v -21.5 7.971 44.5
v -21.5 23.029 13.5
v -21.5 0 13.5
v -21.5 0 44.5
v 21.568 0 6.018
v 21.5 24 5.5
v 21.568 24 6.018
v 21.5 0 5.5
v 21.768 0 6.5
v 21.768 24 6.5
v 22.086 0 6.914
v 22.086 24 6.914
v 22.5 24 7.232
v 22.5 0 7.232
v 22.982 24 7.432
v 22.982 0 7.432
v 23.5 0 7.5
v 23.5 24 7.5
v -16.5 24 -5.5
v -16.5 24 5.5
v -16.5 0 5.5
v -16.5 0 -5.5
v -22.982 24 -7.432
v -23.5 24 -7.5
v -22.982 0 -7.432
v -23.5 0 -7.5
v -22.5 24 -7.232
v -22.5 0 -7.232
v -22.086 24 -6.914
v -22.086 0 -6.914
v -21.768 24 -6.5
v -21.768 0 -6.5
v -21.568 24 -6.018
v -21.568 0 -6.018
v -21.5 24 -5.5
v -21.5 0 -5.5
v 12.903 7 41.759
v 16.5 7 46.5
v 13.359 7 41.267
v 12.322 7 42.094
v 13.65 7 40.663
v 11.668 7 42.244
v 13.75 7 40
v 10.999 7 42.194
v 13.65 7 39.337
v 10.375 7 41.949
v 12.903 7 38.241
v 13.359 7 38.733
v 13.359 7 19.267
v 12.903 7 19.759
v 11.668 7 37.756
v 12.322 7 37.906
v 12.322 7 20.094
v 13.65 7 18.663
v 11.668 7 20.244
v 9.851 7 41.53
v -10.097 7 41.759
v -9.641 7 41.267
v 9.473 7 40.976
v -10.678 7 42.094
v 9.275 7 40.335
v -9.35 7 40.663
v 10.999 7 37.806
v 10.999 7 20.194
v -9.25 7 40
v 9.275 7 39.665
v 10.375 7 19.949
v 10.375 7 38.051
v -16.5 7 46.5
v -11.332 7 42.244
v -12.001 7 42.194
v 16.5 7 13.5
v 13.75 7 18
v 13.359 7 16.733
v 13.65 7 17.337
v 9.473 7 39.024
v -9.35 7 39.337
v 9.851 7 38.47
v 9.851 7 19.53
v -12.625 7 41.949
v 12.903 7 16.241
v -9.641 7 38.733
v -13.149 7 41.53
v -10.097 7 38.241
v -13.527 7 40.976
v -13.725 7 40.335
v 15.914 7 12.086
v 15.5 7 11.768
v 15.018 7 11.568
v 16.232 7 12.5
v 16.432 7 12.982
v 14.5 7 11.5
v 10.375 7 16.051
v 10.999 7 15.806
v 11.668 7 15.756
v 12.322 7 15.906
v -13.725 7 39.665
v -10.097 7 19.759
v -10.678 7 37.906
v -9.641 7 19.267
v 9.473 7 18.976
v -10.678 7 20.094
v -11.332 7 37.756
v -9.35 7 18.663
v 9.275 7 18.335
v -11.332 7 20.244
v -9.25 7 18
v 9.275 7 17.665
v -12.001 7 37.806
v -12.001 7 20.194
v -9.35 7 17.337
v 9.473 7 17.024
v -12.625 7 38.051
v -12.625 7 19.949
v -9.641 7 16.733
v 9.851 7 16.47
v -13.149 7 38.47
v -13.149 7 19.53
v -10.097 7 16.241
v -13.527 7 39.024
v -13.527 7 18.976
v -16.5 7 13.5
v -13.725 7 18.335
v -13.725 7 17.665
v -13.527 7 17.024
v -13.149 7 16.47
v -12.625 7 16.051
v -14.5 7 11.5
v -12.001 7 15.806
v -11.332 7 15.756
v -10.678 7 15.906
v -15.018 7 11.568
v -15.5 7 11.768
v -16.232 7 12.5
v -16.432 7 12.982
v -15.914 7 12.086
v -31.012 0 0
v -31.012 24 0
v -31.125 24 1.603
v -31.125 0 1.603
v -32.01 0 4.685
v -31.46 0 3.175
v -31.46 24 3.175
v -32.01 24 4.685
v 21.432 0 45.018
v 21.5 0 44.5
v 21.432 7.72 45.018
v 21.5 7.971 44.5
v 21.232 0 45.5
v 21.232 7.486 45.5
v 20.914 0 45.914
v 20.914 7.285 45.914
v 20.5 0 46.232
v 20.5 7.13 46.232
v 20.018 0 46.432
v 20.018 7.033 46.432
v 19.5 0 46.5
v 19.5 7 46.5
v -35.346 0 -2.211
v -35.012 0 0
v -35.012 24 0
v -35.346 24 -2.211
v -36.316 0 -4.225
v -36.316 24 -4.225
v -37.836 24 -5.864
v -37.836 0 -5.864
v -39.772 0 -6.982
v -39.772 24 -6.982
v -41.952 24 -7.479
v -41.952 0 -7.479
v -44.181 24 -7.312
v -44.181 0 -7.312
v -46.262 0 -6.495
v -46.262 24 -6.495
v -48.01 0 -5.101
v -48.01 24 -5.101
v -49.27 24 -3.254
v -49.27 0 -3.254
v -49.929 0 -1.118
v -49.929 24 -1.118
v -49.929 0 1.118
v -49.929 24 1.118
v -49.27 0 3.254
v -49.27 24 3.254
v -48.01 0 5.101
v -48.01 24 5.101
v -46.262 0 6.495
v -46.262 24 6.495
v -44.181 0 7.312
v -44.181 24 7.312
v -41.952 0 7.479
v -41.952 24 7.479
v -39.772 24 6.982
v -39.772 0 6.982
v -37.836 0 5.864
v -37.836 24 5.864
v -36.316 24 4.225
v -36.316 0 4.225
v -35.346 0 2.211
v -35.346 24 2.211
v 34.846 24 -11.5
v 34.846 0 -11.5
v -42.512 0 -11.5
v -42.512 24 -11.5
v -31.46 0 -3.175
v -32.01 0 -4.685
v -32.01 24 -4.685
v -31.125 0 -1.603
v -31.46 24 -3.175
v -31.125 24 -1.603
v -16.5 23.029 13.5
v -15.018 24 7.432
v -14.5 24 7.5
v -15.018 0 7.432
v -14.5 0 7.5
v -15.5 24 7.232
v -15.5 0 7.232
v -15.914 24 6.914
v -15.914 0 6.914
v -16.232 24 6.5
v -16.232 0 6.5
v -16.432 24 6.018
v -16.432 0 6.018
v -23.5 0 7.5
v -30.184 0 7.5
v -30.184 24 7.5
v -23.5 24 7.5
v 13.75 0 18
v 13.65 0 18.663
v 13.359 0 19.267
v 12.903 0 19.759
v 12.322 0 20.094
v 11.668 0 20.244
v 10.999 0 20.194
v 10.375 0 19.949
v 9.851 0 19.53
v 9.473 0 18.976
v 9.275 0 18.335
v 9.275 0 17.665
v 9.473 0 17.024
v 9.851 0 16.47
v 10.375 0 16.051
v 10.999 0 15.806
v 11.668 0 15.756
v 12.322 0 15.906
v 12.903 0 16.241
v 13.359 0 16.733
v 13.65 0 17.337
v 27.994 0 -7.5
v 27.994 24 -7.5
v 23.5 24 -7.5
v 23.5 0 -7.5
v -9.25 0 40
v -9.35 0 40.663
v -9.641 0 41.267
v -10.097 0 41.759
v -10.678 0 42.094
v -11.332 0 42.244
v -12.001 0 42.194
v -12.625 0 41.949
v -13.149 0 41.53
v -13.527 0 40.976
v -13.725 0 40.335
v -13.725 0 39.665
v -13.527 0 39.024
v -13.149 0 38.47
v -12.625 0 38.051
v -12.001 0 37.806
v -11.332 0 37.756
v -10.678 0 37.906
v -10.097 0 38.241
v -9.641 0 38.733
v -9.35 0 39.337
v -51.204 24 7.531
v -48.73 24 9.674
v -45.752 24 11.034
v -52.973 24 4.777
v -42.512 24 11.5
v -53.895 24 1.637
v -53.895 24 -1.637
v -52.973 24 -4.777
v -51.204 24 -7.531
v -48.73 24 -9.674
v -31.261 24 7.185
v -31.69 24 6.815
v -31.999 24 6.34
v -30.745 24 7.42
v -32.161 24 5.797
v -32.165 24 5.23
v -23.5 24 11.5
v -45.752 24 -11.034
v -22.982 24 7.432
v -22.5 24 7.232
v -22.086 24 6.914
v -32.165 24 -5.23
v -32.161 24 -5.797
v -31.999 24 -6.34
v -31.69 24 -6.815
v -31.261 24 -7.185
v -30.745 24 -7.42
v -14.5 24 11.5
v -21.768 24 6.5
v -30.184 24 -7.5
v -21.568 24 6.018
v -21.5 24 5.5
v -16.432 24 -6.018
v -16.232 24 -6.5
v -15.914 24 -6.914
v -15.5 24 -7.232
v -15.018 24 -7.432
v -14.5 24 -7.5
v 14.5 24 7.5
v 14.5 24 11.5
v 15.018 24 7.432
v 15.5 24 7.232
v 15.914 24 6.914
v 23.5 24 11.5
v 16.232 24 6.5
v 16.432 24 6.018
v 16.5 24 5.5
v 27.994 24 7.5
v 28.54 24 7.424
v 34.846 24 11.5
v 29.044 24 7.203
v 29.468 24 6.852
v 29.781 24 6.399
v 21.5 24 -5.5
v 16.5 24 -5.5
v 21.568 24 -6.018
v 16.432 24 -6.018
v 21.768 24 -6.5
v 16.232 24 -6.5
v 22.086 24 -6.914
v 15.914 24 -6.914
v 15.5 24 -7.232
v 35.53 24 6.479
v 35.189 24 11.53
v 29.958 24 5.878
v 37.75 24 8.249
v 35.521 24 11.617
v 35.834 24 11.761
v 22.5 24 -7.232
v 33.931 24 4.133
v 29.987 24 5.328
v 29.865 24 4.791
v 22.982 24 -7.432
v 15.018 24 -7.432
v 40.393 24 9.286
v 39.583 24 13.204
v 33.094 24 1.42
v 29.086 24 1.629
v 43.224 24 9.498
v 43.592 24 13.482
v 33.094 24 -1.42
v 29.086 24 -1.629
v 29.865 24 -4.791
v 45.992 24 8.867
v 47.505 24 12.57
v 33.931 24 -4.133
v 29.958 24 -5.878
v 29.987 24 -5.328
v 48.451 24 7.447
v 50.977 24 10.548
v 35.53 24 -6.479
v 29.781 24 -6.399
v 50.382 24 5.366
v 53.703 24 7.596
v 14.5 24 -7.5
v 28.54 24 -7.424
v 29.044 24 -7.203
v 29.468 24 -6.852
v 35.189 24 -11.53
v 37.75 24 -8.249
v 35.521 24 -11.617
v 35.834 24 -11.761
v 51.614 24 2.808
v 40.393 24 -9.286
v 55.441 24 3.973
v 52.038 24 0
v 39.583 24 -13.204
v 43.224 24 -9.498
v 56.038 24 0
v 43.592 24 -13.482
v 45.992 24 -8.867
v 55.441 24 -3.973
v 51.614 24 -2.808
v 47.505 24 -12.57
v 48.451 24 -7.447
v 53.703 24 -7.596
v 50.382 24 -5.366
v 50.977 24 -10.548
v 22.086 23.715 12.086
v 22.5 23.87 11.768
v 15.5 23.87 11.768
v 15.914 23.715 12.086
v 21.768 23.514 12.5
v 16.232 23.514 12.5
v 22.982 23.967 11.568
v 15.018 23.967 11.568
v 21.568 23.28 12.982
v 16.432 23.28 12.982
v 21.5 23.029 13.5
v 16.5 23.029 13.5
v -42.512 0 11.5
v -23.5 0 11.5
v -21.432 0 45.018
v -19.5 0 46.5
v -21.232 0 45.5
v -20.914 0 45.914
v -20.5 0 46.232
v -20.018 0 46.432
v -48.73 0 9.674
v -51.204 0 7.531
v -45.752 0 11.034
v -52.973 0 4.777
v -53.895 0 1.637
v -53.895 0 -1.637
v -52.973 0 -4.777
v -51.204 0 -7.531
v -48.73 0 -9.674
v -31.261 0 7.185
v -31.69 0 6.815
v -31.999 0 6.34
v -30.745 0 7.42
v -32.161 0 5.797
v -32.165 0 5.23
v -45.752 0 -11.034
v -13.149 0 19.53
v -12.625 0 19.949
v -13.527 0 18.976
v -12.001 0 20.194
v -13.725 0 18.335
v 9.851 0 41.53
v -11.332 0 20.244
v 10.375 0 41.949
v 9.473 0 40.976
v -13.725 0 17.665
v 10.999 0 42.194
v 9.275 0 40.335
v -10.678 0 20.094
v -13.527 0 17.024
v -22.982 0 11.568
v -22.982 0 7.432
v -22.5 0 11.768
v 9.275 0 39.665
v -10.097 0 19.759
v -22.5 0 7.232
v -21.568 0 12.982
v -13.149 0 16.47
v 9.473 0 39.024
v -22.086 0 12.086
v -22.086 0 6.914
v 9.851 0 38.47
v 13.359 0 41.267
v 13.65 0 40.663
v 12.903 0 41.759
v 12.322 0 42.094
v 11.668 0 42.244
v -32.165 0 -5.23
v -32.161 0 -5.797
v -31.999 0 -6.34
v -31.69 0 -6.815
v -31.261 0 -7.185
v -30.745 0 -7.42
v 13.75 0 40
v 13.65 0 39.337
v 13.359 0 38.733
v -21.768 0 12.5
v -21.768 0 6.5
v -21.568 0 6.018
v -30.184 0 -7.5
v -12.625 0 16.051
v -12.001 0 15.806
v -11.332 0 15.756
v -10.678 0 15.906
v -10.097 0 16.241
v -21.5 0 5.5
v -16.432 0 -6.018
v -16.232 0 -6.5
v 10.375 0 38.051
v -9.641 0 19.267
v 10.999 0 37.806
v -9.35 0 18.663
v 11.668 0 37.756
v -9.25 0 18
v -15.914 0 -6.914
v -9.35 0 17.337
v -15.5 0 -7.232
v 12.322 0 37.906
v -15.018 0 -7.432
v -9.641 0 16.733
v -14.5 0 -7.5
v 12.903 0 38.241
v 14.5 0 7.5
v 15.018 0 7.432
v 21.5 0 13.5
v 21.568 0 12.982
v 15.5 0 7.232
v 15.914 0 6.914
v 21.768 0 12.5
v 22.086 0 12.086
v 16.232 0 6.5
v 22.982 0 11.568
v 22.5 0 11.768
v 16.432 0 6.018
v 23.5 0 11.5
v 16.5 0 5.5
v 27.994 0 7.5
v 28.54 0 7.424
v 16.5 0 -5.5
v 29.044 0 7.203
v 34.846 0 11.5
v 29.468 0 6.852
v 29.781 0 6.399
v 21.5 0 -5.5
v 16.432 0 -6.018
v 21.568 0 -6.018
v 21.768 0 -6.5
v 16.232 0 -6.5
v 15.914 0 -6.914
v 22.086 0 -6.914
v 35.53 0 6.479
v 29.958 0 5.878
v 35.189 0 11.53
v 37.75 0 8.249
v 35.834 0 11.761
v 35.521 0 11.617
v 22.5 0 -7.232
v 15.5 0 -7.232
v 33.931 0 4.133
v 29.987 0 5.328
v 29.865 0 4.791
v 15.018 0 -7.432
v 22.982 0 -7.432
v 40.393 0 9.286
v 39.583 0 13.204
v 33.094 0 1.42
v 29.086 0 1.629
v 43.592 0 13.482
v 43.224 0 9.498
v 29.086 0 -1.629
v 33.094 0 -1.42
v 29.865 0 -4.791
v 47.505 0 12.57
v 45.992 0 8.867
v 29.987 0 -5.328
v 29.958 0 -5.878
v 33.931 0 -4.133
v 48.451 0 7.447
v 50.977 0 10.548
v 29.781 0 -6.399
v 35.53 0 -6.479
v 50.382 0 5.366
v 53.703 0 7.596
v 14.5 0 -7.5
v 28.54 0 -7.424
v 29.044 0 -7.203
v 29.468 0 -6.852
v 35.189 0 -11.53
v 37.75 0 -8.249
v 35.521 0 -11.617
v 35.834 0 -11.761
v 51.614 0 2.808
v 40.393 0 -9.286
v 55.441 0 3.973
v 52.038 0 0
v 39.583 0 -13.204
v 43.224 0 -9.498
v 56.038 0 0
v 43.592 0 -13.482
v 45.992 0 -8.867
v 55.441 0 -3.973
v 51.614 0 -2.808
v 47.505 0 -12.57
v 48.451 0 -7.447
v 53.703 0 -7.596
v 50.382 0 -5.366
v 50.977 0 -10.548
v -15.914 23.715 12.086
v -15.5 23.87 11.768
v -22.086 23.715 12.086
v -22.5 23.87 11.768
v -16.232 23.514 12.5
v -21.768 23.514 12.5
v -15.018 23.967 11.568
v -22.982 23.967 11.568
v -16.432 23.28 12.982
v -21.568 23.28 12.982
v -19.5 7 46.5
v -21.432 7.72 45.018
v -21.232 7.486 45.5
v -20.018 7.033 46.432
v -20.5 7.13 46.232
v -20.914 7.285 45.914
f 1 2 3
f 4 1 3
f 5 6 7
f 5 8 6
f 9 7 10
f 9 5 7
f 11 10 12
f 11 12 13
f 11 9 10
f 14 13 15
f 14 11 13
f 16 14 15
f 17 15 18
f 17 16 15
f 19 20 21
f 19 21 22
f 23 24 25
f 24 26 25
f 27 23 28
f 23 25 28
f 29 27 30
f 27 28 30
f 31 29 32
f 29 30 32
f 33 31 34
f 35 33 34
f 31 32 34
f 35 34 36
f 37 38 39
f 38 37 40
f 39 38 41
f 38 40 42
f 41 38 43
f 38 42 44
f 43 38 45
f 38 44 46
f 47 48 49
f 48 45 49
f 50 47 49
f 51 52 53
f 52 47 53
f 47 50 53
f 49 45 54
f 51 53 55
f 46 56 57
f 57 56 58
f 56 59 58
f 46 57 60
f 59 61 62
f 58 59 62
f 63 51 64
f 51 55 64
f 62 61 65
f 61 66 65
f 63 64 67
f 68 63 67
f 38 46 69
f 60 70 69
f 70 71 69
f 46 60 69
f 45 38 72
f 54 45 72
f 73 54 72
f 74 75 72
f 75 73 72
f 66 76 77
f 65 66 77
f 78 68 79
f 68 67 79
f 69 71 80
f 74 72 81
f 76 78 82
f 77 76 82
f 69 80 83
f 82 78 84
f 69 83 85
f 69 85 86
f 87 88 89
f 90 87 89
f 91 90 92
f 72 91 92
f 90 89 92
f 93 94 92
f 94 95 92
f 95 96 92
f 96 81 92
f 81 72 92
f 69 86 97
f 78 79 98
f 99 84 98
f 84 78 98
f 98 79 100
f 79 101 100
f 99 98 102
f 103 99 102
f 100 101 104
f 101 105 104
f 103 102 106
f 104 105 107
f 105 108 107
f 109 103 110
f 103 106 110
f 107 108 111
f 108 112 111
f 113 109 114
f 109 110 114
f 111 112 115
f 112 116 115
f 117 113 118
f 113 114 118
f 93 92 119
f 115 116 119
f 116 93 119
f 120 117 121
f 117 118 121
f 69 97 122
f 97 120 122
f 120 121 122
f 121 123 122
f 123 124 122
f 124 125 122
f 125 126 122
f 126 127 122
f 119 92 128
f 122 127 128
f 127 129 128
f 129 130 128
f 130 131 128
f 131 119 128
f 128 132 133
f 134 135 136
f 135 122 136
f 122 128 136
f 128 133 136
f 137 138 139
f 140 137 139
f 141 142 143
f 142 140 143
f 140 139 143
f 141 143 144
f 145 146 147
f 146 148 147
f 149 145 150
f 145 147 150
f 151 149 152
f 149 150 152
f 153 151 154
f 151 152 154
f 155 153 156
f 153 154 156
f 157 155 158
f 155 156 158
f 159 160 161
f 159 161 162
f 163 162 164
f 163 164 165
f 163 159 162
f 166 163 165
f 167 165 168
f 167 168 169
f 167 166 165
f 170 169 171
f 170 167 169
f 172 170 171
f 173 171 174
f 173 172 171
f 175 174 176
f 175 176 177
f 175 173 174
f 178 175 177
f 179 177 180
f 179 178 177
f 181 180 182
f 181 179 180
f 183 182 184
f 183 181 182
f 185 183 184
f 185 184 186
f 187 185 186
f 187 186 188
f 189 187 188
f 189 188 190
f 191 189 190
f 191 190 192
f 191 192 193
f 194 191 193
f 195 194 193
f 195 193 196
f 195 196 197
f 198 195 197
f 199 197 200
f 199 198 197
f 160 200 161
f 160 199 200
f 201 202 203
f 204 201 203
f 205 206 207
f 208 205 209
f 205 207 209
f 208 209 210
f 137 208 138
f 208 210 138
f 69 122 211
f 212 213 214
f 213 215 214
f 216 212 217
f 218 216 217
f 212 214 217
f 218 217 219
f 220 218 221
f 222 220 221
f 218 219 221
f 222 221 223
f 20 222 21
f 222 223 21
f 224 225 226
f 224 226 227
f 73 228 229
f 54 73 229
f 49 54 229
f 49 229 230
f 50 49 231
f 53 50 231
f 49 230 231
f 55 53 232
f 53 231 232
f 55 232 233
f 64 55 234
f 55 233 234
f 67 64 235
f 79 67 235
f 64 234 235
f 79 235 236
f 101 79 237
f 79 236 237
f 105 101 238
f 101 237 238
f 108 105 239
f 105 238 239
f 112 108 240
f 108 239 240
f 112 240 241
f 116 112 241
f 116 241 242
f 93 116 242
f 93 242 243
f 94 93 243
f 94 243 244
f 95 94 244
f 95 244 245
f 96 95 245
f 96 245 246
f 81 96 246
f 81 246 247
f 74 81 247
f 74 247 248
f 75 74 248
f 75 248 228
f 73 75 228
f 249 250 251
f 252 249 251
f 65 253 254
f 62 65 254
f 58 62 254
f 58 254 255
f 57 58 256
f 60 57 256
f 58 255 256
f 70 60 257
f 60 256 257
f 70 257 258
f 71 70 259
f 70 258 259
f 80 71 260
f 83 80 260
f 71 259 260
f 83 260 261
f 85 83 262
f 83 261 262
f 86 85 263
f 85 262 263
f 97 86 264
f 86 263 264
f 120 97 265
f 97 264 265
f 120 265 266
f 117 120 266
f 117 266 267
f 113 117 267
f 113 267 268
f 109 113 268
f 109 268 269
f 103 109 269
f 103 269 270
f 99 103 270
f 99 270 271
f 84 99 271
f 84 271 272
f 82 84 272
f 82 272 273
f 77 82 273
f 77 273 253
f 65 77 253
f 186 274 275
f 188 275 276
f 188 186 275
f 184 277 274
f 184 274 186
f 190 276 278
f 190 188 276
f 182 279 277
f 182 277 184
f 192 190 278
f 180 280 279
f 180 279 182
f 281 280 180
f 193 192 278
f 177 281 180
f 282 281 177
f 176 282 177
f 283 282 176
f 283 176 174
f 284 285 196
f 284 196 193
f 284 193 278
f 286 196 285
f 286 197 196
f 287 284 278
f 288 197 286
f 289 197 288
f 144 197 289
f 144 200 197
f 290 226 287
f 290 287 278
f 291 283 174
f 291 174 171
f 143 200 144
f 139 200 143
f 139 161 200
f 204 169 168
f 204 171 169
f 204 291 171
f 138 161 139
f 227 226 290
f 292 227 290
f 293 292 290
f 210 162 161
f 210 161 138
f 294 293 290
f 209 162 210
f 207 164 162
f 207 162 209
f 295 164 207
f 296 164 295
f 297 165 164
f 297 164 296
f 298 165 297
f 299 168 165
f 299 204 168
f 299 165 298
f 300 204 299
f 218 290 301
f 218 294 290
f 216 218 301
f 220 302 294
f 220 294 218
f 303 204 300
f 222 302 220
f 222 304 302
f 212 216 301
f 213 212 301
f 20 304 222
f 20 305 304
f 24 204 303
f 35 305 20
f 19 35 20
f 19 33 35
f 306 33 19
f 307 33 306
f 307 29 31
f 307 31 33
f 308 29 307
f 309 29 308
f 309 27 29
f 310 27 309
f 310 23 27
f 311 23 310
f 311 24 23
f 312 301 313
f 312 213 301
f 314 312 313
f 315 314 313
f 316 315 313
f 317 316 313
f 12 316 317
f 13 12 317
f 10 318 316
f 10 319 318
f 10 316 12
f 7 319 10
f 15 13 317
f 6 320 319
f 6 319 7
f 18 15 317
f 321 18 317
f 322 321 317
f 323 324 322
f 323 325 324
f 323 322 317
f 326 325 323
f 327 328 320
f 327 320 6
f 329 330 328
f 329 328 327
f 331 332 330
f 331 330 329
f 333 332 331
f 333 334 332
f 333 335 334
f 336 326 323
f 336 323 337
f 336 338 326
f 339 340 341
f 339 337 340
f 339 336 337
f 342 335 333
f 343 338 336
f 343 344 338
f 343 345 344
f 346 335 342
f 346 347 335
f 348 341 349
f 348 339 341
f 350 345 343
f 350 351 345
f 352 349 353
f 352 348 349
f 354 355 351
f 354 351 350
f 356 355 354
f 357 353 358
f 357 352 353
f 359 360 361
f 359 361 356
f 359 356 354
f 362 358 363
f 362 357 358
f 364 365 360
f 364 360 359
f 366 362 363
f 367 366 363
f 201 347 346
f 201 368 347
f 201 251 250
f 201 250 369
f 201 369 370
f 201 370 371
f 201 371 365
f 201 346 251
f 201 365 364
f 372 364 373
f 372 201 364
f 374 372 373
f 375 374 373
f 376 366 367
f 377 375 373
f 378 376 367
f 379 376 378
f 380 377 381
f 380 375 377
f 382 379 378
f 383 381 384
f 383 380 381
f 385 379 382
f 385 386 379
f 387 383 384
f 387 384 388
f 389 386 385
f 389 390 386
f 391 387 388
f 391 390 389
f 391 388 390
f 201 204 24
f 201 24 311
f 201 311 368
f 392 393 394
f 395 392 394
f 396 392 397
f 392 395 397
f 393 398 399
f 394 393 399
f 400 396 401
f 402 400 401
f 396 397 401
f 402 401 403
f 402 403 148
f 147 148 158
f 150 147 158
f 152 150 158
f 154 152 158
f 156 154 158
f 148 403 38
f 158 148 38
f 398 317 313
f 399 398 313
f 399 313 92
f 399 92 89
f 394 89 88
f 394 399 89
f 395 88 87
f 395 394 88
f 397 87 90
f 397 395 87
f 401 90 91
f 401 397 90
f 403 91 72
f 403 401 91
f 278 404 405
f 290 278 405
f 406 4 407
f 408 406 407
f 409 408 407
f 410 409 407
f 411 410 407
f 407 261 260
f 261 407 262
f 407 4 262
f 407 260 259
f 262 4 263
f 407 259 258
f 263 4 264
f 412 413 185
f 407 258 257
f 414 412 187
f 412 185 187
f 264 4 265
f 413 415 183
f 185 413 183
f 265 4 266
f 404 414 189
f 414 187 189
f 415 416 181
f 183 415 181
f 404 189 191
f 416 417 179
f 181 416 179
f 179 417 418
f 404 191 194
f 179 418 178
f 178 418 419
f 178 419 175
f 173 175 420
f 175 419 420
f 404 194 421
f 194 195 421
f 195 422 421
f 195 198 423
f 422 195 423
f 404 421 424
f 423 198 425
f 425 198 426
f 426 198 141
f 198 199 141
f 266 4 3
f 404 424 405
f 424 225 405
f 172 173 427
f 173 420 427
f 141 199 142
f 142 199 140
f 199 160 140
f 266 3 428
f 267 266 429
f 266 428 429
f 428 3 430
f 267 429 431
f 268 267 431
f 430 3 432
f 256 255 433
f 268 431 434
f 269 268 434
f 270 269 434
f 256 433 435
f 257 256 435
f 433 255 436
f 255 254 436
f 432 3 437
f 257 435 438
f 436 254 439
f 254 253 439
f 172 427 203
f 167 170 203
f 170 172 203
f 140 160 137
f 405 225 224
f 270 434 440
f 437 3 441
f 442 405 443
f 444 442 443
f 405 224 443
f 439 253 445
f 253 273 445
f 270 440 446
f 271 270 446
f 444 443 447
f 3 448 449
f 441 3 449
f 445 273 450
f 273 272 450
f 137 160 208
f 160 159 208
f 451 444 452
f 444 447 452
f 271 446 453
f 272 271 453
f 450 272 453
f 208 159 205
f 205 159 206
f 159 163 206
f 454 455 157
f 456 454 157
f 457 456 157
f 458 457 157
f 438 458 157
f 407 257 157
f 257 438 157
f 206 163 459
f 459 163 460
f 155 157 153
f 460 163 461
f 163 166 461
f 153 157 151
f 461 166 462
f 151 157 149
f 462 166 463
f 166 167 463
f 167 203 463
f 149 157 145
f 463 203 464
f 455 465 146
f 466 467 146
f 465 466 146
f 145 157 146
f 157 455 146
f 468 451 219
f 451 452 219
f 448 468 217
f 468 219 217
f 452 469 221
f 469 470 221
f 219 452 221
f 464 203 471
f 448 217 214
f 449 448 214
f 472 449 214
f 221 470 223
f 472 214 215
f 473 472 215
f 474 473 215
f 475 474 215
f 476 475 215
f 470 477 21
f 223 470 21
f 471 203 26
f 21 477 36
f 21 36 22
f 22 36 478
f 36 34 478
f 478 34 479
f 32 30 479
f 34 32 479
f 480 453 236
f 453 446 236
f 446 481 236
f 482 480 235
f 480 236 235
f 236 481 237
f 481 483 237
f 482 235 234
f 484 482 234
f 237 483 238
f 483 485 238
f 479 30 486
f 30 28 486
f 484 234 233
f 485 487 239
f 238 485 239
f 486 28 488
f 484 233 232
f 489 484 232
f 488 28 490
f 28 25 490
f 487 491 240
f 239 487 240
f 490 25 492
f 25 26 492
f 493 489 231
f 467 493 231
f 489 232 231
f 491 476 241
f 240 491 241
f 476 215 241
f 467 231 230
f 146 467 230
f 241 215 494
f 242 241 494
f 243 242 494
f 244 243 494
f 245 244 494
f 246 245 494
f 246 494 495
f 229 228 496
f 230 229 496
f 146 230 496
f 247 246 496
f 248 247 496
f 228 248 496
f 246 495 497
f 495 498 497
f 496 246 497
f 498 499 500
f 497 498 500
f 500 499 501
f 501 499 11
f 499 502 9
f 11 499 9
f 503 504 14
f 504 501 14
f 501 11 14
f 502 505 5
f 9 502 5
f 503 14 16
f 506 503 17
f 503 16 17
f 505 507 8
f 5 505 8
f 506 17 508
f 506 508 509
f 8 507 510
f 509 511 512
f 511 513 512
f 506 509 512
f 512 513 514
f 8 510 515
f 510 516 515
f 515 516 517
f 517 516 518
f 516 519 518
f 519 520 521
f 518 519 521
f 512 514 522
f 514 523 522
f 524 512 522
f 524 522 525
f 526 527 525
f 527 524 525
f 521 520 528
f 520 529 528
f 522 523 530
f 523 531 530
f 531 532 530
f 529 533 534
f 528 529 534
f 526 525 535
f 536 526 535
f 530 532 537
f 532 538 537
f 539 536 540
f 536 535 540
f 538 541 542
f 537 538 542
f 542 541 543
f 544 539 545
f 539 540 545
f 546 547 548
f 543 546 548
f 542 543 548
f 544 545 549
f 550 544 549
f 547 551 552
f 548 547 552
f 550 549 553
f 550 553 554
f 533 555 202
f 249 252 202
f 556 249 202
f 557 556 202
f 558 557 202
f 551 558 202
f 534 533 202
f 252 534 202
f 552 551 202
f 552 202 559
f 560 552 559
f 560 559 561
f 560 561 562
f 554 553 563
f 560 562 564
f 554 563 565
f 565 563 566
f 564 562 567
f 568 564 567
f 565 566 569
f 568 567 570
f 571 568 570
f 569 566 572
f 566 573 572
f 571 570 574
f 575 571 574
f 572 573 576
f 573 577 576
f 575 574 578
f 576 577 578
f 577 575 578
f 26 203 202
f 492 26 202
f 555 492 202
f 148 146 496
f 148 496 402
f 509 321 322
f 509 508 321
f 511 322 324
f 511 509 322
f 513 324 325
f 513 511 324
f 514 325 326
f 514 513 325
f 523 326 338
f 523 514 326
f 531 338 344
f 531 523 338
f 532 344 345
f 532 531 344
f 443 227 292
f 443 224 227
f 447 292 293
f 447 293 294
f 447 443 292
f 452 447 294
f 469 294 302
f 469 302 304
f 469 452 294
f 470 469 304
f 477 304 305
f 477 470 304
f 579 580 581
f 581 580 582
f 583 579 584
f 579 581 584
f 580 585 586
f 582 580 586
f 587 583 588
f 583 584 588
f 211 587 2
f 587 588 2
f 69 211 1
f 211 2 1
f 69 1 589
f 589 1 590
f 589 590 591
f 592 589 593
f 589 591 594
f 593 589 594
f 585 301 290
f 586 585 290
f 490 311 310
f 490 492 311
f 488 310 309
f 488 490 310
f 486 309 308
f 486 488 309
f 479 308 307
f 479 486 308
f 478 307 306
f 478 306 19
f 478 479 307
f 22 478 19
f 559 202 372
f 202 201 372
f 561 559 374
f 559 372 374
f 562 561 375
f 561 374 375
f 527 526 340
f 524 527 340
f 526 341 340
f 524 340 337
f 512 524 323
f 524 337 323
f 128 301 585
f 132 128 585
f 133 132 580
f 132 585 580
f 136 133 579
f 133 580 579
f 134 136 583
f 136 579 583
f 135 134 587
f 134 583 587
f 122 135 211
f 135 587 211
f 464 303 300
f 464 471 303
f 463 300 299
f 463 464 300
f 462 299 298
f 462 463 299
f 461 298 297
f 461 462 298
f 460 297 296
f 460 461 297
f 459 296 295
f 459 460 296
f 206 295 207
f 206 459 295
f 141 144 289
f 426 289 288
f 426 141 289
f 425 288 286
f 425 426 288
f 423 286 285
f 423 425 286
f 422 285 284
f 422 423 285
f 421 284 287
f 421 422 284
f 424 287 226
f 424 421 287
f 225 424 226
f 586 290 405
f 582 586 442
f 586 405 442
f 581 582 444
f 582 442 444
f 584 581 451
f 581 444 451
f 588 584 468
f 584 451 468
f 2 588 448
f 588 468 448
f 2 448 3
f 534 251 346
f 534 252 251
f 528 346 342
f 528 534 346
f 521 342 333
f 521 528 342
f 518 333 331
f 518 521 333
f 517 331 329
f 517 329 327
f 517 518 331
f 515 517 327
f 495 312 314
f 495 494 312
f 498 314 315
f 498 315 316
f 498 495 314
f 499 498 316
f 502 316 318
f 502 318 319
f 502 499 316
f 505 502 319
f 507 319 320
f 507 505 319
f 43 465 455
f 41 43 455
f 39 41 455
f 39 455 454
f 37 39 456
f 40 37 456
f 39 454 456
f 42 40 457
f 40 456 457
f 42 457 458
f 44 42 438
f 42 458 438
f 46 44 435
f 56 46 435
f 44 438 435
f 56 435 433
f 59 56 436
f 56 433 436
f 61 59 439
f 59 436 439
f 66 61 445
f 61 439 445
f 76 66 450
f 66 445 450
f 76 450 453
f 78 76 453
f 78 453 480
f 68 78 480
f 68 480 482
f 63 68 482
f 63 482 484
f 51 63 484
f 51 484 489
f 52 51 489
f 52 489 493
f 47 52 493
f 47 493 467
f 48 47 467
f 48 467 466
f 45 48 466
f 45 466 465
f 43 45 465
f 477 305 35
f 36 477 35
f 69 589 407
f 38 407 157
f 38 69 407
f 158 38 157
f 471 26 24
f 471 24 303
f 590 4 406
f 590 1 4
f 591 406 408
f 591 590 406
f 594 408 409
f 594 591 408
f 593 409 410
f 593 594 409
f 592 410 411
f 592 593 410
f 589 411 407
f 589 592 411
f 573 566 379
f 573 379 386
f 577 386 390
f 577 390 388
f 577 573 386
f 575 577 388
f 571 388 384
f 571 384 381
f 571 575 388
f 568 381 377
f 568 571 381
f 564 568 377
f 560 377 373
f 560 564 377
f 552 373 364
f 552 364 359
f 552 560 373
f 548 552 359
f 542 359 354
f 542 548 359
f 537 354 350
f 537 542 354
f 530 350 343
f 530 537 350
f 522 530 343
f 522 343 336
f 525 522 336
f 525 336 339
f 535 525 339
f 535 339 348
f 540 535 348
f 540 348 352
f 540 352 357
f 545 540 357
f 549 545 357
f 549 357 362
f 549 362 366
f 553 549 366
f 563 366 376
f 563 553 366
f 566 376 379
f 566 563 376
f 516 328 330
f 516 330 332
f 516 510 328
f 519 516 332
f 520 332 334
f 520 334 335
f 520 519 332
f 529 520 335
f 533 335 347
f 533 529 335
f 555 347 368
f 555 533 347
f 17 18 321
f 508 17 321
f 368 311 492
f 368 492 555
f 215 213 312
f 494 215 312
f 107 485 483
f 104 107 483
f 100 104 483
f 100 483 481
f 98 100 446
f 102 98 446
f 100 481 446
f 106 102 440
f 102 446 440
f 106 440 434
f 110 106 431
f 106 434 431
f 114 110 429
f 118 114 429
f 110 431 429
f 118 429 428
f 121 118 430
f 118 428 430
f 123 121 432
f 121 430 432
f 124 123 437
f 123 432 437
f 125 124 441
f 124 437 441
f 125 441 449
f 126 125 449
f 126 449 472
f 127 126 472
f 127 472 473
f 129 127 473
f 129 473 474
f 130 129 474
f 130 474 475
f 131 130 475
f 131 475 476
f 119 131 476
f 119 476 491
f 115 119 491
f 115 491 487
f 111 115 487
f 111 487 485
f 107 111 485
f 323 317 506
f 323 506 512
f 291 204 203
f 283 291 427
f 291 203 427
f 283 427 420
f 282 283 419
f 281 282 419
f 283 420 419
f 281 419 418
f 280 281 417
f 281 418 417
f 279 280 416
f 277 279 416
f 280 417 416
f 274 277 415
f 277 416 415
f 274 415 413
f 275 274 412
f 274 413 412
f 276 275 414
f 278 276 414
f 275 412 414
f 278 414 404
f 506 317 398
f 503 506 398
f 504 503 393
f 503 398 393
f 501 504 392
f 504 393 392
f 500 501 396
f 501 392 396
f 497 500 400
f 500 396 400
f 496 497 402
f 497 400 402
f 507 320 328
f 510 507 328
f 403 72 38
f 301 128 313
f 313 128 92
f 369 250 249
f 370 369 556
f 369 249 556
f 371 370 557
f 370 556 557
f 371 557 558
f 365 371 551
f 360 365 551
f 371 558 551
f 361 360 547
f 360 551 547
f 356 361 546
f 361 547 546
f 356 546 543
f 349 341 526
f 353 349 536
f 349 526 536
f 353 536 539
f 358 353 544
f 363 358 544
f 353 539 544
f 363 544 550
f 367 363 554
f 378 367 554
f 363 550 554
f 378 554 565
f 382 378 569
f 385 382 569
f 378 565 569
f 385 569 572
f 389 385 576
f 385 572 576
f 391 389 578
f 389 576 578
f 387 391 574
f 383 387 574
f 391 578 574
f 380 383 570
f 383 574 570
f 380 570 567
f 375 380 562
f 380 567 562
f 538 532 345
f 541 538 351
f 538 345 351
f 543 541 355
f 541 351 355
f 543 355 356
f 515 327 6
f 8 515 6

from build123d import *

# Parameters (mm, degrees)
SKETCH1_R               = 7.5
SKETCH1_R_2             = 9.525
BOSS_EXTRUDE1_DEPTH     = 24
SKETCH8_W               = 5
SKETCH8_H               = 17
BOSS_EXTRUDE4_DEPTH     = 35
CUT_EXTRUDE4_DEPTH      = 33.5125
CUT_EXTRUDE4_DEPTH_BACK = 52
SKETCH10_W              = 33
SKETCH10_H              = 15
CUT_EXTRUDE5_DEPTH      = 35
FILLET1_R               = 2
SKETCH12_R              = 2.25
CUT_EXTRUDE6_DEPTH      = 35


with BuildPart() as part:
    # Sketch1 → Boss-Extrude1 (new body)
    with BuildSketch(Plane(origin=(0, 0, 0), x_dir=(1, 0, 0), z_dir=(0, 1, 0))):
        with BuildLine():
            Line((35.393818591, 11.5), (-42.5125, 11.5))
            ThreePointArc((-42.5125, 11.5), (-54.0125, 0), (-42.5125, -11.5))
            Line((-42.5125, -11.5), (35.393818591, -11.5))
            ThreePointArc((35.393818591, -11.5), (56.0375, 0), (35.393818591, 11.5))
        make_face()
        with Locations((-42.5125, 0)):
            Circle(SKETCH1_R, mode=Mode.SUBTRACT)
        with Locations((42.5125, 0)):
            Circle(SKETCH1_R_2, mode=Mode.SUBTRACT)
    extrude(amount=BOSS_EXTRUDE1_DEPTH)

    # Sketch8 → Boss-Extrude4 (add)
    with BuildSketch(Plane.XY.offset(11.5)):
        with Locations((-19, 15.5)):
            Rectangle(SKETCH8_W, SKETCH8_H)
        Polygon((-16.5, 7), (-21.5, 7), (-21.5, 0), (21.5, 0), (21.5, 7), (16.5, 7), align=None)
        with Locations((19, 15.5)):
            Rectangle(SKETCH8_W, SKETCH8_H)
    extrude(amount=BOSS_EXTRUDE4_DEPTH)

    # Sketch9 → Cut-Extrude4 (cut, two sides)
    with BuildSketch(Plane.ZY.offset(21.5)) as cut_extrude4_sk:
        Polygon((11.5, 24), (46.5, 7), (46.5, 24), align=None)
    extrude(amount=CUT_EXTRUDE4_DEPTH, mode=Mode.SUBTRACT)
    extrude(cut_extrude4_sk.sketch, amount=-CUT_EXTRUDE4_DEPTH_BACK, mode=Mode.SUBTRACT)

    # Sketch10 → Cut-Extrude5 (cut)
    with BuildSketch(Plane(origin=(0, 24, 0), x_dir=(1, 0, 0), z_dir=(0, 1, 0))):
        with BuildLine():
            Line((-21.5, 7.5), (-33.794702113, 7.5))
            ThreePointArc((-33.794702113, 7.5), (-31.730462259, 3.999707758), (-31.0125, 0))
            ThreePointArc((-31.0125, 0), (-31.730462259, -3.999707758), (-33.794702113, -7.5))
            Line((-33.794702113, -7.5), (-21.5, -7.5))
            Line((-21.5, -7.5), (-21.5, 7.5))
        make_face()
        Rectangle(SKETCH10_W, SKETCH10_H)
        with BuildLine():
            Line((31.257473345, 7.5), (21.5, 7.5))
            Line((21.5, 7.5), (21.5, -7.5))
            Line((21.5, -7.5), (31.257473345, -7.5))
            ThreePointArc((31.257473345, -7.5), (28.9875, 0), (31.257473345, 7.5))
        make_face()
    extrude(amount=-CUT_EXTRUDE5_DEPTH, mode=Mode.SUBTRACT)

    # Fillet1
    fillet1_edges = [part.edges().sort_by_distance(p)[0] for p in [
        (-16.5, 12, -7.5),
        (16.5, 12, -7.5),
        (31.257473345, 12, -7.5),
        (31.257473345, 12, 7.5),
        (21.5, 12, 7.5),
        (35.393818591, 12, 11.5),
        (21.5, 12, -7.5),
        (35.393818591, 12, -11.5),
        (-21.5, 3.5, 46.5),
        (-16.5, 15.5, 11.5),
        (-21.5, 12, 11.5),
        (16.5, 15.5, 11.5),
        (21.5, 12, 11.5),
        (21.5, 3.5, 46.5),
        (-33.794702113, 12, 7.5),
        (-33.794702113, 12, -7.5),
        (-21.5, 12, -7.5),
        (-21.5, 12, 7.5),
        (16.5, 12, 7.5),
        (-16.5, 12, 7.5),
    ]]
    fillet(fillet1_edges, radius=FILLET1_R)

    # Sketch12 → Cut-Extrude6 (cut)
    with BuildSketch(Plane.XZ):
        with Locations((-11.5, 40)):
            Circle(SKETCH12_R)
        with Locations((-11.5, 18)):
            Circle(SKETCH12_R)
        with Locations((11.5, 40)):
            Circle(SKETCH12_R)
        with Locations((11.5, 18)):
            Circle(SKETCH12_R)
    extrude(amount=-CUT_EXTRUDE6_DEPTH, mode=Mode.SUBTRACT)


solid = part.part
